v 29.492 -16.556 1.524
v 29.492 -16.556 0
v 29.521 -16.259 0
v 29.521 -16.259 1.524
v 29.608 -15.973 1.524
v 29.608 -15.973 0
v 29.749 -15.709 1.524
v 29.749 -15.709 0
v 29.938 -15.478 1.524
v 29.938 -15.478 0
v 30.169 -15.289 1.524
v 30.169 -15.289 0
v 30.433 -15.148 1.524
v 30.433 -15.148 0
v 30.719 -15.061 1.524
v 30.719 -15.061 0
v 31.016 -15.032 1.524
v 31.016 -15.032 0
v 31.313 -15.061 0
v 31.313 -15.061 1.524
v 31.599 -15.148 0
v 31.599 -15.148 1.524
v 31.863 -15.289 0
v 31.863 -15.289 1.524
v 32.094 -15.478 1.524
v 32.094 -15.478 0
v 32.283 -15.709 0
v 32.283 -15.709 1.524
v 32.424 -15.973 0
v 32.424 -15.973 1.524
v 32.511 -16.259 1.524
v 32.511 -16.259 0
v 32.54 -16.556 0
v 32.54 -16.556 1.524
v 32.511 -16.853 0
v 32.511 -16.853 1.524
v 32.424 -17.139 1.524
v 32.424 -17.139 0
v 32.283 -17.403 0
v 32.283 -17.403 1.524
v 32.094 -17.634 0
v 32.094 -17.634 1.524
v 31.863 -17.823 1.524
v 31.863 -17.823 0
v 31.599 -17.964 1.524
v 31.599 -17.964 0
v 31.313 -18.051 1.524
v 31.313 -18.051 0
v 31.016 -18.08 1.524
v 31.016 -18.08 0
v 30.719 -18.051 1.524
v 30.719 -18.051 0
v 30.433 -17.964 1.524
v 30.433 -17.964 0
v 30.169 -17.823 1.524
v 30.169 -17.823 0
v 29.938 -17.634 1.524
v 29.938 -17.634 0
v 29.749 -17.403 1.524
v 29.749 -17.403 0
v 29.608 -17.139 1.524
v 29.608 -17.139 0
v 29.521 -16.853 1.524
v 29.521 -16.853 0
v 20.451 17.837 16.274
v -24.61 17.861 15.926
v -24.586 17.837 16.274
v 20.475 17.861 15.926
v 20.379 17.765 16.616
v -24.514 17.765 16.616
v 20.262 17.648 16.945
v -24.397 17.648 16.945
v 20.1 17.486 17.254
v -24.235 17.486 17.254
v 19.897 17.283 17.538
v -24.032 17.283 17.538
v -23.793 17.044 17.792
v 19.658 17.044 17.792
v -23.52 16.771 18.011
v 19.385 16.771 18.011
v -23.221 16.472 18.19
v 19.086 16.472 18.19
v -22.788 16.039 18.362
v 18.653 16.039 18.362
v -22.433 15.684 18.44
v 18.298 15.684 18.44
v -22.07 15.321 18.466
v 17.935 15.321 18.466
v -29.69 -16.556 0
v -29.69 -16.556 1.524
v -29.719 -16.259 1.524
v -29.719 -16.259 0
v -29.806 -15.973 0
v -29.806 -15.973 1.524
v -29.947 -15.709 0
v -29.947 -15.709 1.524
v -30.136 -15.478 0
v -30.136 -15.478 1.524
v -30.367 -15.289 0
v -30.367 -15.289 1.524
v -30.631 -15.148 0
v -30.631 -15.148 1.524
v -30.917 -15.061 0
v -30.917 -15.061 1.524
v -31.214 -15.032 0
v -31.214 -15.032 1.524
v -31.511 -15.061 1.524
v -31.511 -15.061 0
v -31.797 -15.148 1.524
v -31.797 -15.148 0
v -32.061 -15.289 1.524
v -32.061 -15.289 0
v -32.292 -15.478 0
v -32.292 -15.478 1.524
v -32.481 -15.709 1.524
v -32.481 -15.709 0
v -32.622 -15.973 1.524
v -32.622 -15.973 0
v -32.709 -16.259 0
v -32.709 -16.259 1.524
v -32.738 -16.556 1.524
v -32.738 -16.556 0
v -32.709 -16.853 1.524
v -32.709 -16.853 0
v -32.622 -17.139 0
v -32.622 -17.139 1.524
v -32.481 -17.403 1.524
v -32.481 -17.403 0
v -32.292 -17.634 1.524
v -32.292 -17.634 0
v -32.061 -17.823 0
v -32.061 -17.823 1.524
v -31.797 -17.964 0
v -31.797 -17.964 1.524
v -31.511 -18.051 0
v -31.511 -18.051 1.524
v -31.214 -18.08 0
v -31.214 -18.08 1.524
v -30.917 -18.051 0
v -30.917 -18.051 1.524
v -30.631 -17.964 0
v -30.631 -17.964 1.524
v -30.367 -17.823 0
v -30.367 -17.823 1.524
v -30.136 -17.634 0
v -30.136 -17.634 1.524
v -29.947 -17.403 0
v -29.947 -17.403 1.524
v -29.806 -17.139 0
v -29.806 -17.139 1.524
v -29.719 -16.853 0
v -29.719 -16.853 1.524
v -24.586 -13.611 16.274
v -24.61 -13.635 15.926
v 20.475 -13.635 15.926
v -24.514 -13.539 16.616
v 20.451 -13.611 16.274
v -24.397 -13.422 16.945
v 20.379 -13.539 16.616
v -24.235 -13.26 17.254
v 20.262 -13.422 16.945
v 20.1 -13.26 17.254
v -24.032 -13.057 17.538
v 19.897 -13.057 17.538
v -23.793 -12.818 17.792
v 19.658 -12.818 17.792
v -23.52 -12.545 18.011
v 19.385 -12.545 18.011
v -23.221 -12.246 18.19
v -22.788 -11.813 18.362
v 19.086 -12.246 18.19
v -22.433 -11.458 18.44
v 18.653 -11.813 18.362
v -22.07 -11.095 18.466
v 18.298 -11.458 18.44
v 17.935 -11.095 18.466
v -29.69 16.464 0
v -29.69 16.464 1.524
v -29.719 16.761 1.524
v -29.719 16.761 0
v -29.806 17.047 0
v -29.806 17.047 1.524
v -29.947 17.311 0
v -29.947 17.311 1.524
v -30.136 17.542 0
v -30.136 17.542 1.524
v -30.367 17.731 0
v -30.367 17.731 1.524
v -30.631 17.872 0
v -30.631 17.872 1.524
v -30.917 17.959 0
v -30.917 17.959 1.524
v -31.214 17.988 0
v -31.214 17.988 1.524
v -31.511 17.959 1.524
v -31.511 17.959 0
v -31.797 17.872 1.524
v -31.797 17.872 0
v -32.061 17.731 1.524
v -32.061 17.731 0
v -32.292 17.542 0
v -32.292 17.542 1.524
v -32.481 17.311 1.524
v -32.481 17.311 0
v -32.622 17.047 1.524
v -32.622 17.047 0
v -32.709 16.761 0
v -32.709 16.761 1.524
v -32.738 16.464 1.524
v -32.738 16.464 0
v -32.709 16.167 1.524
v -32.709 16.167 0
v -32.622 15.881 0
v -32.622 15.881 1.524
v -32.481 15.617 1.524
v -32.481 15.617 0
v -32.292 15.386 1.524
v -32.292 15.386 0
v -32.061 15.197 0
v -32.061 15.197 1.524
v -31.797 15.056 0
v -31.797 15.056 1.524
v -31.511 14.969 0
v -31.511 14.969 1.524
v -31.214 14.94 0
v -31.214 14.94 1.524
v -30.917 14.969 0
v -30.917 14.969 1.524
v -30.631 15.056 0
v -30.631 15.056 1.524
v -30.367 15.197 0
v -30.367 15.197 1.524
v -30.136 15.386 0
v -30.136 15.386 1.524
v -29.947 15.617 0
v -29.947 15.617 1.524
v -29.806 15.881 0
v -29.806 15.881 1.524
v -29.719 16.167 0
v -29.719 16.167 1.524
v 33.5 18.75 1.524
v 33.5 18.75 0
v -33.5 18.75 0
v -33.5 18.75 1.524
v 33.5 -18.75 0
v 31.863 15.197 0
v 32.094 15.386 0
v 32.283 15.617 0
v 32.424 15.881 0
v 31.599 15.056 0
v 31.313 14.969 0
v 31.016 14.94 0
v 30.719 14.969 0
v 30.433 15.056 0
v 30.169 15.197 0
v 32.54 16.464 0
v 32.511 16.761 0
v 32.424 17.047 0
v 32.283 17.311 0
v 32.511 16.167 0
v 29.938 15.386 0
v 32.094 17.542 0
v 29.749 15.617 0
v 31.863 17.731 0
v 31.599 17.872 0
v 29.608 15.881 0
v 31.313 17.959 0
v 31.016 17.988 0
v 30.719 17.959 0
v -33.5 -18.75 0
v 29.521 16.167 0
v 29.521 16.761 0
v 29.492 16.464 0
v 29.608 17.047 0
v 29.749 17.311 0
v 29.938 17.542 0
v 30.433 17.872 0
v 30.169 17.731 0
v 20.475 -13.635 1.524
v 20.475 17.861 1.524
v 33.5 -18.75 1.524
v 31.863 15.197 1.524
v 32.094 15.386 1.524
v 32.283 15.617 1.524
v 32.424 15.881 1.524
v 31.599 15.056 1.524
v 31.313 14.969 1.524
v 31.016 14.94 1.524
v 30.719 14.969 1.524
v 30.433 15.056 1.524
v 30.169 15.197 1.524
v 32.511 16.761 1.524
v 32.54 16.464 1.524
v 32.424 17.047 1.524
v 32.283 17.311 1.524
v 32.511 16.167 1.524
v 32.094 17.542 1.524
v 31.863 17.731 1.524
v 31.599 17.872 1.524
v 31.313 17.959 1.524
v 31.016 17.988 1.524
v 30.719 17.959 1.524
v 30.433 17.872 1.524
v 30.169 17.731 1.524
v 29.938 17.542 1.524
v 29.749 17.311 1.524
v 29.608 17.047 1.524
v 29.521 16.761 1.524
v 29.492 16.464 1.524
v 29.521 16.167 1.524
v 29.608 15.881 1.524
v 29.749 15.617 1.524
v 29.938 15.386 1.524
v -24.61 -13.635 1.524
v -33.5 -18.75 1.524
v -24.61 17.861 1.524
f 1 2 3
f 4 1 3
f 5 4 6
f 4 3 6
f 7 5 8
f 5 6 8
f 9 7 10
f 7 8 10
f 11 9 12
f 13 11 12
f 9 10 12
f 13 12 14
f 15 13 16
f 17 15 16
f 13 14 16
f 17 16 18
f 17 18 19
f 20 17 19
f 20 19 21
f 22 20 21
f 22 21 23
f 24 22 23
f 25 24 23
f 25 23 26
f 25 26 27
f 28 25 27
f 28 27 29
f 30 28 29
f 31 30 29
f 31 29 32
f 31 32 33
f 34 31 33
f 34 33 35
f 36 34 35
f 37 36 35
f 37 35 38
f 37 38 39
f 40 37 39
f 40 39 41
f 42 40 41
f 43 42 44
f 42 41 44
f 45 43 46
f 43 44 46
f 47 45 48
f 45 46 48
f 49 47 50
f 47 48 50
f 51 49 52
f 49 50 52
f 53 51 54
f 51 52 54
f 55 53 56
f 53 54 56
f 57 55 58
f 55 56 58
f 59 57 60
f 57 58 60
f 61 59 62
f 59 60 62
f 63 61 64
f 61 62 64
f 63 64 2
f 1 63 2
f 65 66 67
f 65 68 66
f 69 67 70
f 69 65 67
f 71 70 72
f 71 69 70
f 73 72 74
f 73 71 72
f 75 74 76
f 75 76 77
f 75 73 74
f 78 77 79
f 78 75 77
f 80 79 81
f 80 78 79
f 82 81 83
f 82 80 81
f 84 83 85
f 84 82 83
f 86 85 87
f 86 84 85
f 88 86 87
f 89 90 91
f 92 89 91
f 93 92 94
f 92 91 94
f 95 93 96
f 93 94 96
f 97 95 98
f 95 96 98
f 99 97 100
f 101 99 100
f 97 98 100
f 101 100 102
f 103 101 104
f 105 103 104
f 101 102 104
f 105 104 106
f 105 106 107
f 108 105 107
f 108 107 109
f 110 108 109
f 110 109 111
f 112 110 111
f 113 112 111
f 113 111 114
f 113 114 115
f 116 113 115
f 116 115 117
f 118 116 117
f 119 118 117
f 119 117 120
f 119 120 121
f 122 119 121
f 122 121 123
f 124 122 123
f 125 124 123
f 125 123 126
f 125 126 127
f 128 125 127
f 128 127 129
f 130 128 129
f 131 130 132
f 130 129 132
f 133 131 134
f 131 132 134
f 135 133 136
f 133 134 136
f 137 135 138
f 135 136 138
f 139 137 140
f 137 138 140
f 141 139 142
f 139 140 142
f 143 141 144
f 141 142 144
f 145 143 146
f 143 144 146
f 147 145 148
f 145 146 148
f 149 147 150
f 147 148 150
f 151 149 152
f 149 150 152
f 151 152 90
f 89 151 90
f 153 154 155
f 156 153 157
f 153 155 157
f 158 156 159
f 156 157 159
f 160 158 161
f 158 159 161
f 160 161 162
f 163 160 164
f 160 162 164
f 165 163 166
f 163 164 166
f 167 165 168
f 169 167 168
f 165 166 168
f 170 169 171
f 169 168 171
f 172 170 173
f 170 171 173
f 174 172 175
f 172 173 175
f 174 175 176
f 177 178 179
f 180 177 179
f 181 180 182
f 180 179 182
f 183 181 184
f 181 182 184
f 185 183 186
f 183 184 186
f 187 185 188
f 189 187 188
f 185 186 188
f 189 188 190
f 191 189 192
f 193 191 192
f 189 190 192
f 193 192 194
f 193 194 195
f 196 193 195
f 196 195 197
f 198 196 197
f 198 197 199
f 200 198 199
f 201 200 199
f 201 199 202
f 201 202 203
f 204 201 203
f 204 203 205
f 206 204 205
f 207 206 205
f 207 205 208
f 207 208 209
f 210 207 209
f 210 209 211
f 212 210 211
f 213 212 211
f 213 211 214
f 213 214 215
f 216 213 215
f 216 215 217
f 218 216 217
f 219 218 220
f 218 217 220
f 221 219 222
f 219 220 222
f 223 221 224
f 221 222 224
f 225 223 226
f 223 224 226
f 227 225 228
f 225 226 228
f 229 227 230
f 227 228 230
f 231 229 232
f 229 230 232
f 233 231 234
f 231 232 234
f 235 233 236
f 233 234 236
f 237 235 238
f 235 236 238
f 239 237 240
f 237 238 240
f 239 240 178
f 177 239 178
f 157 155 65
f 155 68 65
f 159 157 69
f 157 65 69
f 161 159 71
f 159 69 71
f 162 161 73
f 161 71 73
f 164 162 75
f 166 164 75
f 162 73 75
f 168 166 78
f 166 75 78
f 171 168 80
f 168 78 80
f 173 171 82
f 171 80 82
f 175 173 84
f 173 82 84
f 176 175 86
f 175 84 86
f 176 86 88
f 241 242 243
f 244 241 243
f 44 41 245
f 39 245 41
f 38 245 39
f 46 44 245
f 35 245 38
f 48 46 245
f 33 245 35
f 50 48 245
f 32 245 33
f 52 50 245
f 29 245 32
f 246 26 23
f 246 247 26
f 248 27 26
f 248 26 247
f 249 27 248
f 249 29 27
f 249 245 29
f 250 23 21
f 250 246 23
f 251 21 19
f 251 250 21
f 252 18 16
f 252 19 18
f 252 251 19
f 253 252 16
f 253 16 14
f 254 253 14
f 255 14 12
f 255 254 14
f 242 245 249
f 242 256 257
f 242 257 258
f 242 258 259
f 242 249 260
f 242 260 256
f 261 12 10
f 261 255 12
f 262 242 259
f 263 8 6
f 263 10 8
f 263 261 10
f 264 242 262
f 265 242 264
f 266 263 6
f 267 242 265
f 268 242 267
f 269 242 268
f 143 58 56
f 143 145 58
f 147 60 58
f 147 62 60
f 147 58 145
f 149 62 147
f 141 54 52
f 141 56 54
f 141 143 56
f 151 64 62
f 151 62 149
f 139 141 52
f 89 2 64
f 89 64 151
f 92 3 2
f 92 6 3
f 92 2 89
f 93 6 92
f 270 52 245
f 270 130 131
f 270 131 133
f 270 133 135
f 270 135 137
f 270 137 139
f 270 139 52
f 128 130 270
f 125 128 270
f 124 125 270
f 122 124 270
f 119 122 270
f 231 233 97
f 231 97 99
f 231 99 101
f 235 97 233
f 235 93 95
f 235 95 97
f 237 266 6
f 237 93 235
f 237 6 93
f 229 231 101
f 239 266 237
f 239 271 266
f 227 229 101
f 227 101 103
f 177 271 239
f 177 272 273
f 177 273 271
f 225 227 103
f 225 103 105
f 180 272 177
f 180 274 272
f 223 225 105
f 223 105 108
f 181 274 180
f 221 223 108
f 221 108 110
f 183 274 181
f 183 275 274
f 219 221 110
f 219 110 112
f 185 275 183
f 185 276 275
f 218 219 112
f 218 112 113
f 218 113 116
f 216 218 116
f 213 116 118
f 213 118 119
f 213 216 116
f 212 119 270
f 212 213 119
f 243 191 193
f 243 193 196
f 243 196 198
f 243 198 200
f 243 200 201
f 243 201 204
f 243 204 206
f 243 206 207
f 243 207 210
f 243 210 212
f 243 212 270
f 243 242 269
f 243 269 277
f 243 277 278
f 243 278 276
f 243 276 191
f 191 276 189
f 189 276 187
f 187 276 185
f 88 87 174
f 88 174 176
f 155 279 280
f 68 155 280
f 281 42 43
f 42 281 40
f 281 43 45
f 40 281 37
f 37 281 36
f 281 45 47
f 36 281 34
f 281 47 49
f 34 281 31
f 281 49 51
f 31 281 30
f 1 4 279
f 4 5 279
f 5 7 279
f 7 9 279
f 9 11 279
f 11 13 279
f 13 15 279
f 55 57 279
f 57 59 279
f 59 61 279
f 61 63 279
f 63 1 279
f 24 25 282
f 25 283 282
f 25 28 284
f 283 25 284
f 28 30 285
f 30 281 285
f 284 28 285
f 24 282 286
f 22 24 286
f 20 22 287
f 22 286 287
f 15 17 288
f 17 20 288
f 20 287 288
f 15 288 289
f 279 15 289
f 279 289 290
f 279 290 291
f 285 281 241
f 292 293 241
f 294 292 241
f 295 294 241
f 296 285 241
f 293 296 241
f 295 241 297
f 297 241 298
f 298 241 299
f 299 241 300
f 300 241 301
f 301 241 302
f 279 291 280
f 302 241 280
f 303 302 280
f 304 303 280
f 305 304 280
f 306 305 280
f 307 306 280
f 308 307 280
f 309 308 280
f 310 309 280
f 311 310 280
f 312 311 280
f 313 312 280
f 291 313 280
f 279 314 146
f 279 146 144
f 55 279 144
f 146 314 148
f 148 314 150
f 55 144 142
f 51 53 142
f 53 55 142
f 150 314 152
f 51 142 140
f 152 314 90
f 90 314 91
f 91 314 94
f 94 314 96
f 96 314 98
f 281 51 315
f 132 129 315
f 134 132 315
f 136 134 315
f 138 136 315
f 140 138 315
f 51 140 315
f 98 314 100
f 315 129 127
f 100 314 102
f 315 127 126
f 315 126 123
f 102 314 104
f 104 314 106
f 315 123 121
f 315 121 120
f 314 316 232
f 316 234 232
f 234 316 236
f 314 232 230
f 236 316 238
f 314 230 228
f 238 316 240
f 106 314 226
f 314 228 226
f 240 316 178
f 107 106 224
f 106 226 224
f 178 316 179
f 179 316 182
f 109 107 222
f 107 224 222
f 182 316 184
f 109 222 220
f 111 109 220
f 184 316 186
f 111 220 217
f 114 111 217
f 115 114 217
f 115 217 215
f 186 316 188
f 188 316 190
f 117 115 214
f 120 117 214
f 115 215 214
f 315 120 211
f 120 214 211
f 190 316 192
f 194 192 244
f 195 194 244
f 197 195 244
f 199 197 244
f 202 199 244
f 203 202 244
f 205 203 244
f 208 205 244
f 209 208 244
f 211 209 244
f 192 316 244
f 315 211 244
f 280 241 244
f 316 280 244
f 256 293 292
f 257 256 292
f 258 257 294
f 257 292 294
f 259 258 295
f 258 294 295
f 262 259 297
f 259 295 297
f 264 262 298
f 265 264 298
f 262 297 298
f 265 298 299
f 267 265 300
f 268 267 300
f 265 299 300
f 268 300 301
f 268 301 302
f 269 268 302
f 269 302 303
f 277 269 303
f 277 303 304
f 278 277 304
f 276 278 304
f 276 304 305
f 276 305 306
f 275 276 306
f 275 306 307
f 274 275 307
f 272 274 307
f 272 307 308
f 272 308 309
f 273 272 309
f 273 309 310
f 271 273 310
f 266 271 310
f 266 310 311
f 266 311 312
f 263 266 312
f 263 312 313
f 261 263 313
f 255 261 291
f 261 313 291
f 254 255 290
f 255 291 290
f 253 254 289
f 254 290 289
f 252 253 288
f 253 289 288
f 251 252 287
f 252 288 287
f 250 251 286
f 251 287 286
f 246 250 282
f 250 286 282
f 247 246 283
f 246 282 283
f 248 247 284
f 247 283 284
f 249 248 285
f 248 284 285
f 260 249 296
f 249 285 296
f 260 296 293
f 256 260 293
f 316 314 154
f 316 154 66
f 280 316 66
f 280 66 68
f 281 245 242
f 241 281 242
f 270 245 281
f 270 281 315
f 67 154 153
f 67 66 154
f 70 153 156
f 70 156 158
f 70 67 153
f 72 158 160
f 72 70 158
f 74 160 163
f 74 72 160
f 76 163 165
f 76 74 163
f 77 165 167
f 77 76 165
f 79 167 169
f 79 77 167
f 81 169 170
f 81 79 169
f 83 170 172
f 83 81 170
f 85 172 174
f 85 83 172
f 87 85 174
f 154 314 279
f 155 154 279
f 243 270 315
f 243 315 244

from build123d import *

# Parameters (mm, degrees)
SKETCH1_W           = 67.00000001
SKETCH1_H           = 37.49999993
BOSS_EXTRUDE1_DEPTH = 1.524
SKETCH2_W           = 45.085000006
SKETCH2_H           = 31.496000001
BOSS_EXTRUDE2_DEPTH = 16.9418
HOLE1_D             = 3.048
HOLE2_D             = 3.048
HOLE2_DEPTH         = 18.4658
HOLE3_D             = 3.048
HOLE3_DEPTH         = 18.4658
HOLE4_D             = 3.048
HOLE4_DEPTH         = 18.4658
FILLET1_R           = 2.54


with BuildPart() as part:
    # Sketch1 → Boss-Extrude1 (new body)
    with BuildSketch(Plane(origin=(0, 0, 0), x_dir=(-1, 0, 0), z_dir=(0, 0, -1))):
        Rectangle(SKETCH1_W, SKETCH1_H)
    extrude(amount=-BOSS_EXTRUDE1_DEPTH)

    # Sketch2 → Boss-Extrude2 (add)
    with BuildSketch(Plane.XY.offset(1.524)):
        with Locations((-2.067500005, 2.112999961)):
            Rectangle(SKETCH2_W, SKETCH2_H)
    extrude(amount=BOSS_EXTRUDE2_DEPTH)

    # Hole1 (through all)
    with Locations(Plane.XY.offset(1.524)):
        with Locations((31.015999995, -16.556000035)):
            Hole(HOLE1_D / 2)

    # Hole2
    with Locations(Plane(origin=(0, 0, 0), x_dir=(-1, 0, 0), z_dir=(0, 0, -1))):
        with Locations((31.214000005, -16.556000035)):
            Hole(HOLE2_D / 2, depth=HOLE2_DEPTH)

    # Hole3
    with Locations(Plane(origin=(0, 0, 0), x_dir=(-1, 0, 0), z_dir=(0, 0, -1))):
        with Locations((-31.015999995, 16.463999965)):
            Hole(HOLE3_D / 2, depth=HOLE3_DEPTH)

    # Hole4
    with Locations(Plane(origin=(0, 0, 0), x_dir=(-1, 0, 0), z_dir=(0, 0, -1))):
        with Locations((31.214000005, 16.463999965)):
            Hole(HOLE4_D / 2, depth=HOLE4_DEPTH)

    # Fillet1
    fillet1_edges = [part.edges().sort_by_distance(p)[0] for p in [
        (20.474999998, 2.112999962, 18.4658),
        (-2.067500005, 17.860999962, 18.4658),
        (-24.610000008, 2.112999962, 18.4658),
        (-2.067500005, -13.635000039, 18.4658),
    ]]
    fillet(fillet1_edges, radius=FILLET1_R)


solid = part.part
